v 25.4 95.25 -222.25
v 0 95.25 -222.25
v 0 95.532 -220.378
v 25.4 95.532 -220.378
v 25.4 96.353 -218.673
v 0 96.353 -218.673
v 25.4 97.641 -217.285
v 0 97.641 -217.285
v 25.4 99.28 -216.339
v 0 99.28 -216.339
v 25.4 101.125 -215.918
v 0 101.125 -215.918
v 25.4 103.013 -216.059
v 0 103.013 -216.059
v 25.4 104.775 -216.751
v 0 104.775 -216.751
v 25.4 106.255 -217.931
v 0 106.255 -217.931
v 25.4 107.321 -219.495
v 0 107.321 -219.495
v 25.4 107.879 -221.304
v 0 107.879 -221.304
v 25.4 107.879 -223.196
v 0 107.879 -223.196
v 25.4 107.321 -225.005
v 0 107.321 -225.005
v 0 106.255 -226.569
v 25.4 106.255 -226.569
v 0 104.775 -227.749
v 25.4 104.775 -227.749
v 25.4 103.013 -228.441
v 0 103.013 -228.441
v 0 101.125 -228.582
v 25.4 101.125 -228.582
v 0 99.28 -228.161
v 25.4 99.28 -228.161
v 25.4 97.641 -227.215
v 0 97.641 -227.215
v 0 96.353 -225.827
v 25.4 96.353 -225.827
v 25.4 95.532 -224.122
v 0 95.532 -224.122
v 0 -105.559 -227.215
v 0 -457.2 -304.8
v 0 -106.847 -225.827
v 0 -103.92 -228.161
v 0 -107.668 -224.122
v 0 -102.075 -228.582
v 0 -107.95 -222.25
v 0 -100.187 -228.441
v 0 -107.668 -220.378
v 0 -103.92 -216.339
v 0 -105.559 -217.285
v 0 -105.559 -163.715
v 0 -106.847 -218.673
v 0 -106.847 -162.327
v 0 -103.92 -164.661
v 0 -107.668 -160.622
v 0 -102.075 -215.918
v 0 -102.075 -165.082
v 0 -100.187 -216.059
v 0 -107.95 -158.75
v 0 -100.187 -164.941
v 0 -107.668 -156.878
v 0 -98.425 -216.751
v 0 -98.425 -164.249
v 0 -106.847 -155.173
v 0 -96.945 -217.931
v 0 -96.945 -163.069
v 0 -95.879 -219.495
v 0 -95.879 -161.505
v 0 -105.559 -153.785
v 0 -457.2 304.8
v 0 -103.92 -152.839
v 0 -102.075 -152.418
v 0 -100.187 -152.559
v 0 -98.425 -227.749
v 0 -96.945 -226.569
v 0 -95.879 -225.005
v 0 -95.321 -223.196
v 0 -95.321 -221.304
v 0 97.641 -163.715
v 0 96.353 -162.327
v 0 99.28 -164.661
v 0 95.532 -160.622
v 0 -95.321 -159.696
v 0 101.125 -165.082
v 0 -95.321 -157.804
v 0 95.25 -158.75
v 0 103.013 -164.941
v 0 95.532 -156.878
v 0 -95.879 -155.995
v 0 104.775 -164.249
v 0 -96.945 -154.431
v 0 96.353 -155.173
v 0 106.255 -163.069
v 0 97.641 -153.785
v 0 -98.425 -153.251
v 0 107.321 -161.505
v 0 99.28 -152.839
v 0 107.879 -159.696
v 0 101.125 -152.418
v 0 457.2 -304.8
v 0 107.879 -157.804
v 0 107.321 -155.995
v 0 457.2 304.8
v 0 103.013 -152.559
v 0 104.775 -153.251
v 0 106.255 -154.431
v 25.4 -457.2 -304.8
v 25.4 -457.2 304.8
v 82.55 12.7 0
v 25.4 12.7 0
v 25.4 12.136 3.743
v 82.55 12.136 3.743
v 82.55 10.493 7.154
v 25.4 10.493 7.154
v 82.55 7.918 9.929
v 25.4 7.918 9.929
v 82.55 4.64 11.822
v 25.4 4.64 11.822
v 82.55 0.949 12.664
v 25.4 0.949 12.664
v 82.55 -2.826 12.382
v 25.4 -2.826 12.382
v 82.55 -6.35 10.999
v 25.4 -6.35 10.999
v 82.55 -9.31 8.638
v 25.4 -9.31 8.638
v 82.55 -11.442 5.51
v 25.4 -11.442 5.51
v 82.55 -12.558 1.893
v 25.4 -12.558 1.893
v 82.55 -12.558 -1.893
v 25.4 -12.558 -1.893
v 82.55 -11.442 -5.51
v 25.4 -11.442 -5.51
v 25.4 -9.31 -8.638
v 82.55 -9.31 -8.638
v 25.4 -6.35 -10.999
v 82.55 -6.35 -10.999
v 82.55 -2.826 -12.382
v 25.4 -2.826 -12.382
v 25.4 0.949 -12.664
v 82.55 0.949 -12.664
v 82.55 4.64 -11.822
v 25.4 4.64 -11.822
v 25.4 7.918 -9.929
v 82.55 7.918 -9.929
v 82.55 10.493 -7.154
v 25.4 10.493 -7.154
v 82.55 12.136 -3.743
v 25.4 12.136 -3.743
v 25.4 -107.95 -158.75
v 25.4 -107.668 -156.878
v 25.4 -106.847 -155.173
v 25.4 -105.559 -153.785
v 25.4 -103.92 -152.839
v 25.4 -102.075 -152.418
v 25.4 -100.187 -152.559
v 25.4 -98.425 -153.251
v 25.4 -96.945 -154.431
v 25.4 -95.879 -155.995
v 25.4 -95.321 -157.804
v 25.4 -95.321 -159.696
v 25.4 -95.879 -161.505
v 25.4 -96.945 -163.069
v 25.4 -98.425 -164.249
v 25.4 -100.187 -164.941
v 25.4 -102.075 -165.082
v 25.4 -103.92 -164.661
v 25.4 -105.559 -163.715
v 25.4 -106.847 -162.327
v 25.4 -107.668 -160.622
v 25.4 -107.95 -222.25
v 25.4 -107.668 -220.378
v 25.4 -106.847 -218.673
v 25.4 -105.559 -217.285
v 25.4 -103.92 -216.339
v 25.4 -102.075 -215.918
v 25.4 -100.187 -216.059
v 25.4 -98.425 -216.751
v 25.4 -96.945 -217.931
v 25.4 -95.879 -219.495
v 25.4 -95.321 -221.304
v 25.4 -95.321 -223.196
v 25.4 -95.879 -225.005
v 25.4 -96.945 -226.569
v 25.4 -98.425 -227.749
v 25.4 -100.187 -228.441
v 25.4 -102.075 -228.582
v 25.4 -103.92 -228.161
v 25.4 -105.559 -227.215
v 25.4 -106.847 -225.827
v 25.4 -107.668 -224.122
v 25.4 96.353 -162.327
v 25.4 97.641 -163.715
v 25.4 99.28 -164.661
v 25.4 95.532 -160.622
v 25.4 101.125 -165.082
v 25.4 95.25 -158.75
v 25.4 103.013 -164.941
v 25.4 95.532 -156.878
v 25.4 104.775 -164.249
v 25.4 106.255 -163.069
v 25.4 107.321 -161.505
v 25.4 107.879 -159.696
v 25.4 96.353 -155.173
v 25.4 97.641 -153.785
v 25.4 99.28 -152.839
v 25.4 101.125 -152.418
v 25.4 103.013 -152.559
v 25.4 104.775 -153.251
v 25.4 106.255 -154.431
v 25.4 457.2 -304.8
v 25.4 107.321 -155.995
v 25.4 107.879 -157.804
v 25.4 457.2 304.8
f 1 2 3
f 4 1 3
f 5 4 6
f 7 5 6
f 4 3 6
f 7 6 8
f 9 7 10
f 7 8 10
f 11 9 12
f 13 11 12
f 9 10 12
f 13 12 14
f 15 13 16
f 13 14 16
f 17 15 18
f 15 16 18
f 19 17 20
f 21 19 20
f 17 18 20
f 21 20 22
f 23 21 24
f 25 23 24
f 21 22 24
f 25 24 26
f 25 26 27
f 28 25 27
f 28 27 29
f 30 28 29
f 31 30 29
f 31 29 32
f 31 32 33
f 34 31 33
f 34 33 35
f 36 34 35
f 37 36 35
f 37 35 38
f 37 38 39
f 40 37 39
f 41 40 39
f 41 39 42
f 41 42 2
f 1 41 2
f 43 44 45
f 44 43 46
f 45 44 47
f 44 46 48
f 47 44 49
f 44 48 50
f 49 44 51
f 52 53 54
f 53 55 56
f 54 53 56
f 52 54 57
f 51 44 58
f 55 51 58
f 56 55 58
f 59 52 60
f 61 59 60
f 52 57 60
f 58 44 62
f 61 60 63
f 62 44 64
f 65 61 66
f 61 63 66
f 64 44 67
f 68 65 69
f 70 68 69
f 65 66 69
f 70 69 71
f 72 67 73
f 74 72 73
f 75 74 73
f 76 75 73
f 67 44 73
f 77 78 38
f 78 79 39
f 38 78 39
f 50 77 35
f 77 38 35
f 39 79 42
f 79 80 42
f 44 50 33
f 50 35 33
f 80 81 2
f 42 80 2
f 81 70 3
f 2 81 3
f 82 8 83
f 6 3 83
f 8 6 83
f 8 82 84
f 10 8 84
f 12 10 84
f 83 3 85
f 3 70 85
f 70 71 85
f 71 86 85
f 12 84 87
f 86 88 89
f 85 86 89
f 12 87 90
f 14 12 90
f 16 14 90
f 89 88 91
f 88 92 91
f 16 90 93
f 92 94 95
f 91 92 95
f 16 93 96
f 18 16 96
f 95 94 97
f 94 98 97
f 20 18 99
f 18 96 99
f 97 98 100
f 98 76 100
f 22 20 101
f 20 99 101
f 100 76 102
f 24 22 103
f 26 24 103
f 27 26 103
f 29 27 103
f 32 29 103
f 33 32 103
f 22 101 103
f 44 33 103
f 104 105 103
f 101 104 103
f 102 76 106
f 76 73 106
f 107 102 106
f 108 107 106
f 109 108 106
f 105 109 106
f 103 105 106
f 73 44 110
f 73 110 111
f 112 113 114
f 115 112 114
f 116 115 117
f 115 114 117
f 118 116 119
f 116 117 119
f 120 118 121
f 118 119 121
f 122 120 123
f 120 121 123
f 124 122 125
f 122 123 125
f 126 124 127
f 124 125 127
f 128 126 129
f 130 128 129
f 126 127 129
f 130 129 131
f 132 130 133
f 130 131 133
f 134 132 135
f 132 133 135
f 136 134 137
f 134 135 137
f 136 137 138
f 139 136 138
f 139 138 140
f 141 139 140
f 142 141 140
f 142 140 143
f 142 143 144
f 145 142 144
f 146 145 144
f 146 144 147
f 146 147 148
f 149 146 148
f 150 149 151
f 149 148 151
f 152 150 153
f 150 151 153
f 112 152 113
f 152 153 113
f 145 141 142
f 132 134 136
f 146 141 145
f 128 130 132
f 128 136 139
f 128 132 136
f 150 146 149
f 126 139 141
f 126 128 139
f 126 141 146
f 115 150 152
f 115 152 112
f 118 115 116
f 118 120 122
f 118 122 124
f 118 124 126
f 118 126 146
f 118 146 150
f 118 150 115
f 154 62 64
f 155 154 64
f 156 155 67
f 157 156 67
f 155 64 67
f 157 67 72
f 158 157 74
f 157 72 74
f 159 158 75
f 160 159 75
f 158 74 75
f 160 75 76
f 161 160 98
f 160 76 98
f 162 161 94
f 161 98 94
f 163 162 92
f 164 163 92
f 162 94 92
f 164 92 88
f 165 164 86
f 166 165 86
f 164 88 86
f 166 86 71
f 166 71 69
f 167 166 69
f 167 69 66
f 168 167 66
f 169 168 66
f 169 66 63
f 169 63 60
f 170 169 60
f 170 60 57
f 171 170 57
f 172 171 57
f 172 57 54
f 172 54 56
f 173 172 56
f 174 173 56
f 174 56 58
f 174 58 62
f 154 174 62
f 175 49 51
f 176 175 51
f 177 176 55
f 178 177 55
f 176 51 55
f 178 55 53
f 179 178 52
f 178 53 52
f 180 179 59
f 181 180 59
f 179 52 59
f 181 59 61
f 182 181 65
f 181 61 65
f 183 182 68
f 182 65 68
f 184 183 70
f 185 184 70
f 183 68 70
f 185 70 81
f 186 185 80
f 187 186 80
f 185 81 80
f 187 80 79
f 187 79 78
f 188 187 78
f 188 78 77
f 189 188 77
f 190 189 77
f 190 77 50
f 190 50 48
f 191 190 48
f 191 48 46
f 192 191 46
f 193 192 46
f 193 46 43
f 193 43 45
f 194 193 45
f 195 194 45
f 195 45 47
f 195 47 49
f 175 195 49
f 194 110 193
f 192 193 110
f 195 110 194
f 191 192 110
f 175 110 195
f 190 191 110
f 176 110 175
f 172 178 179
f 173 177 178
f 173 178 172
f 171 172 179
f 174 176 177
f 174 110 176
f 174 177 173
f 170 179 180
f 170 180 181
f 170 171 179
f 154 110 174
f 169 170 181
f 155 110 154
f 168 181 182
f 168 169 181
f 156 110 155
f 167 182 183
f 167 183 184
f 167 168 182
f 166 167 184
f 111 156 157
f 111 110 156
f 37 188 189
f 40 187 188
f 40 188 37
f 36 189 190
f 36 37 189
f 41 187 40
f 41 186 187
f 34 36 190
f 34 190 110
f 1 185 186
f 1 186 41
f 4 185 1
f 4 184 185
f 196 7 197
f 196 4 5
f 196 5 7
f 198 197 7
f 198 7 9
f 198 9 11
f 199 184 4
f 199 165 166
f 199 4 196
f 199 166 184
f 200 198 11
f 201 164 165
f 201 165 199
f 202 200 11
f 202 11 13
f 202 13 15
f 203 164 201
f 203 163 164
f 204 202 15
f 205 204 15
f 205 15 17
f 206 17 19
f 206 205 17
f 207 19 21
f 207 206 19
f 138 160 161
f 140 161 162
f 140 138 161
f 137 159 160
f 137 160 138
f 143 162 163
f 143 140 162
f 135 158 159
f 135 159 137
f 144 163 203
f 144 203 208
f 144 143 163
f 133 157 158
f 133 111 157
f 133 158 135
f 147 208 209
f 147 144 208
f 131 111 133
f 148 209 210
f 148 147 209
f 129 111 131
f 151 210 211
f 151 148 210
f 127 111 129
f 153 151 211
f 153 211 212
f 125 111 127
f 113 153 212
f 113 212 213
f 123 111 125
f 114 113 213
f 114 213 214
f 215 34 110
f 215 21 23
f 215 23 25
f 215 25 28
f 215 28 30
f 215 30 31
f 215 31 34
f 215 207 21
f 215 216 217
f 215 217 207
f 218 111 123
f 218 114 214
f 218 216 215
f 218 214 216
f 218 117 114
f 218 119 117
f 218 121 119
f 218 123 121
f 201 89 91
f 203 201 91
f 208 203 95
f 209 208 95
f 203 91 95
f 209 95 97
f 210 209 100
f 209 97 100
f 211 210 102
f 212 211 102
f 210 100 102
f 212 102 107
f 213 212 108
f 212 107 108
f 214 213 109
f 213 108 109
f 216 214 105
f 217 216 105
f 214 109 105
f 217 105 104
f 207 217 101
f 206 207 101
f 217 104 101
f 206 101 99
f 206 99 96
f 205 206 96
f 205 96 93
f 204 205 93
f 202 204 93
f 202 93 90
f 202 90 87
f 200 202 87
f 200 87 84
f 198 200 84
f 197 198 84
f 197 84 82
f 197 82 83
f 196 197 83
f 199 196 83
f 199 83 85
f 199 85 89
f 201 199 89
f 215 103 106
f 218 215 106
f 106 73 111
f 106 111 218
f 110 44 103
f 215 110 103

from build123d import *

# Parameters (mm, degrees)
F0_W     = 914.4
F0_H     = 609.6
F1_DEPTH = 25.4
F2_R     = 12.7
F3_DEPTH = 57.15
F5_D     = 12.7


with BuildPart() as f1:
    # F0 (on Right) → F1 (new body)
    with BuildSketch(Plane.YZ):
        Rectangle(F0_W, F0_H)
    extrude(amount=F1_DEPTH)

    # F2 (on face) → F3 (join)
    with BuildSketch(Plane.YZ.offset(25.4)):
        Circle(F2_R)
    extrude(amount=F3_DEPTH)

    # F5 (through all)
    with Locations(Plane.YZ.offset(25.4)):
        with Locations((-101.6, -158.75), (101.6, -158.75), (101.6, -222.25), (-101.6, -222.25)):
            Hole(F5_D / 2)


solid = f1.part
